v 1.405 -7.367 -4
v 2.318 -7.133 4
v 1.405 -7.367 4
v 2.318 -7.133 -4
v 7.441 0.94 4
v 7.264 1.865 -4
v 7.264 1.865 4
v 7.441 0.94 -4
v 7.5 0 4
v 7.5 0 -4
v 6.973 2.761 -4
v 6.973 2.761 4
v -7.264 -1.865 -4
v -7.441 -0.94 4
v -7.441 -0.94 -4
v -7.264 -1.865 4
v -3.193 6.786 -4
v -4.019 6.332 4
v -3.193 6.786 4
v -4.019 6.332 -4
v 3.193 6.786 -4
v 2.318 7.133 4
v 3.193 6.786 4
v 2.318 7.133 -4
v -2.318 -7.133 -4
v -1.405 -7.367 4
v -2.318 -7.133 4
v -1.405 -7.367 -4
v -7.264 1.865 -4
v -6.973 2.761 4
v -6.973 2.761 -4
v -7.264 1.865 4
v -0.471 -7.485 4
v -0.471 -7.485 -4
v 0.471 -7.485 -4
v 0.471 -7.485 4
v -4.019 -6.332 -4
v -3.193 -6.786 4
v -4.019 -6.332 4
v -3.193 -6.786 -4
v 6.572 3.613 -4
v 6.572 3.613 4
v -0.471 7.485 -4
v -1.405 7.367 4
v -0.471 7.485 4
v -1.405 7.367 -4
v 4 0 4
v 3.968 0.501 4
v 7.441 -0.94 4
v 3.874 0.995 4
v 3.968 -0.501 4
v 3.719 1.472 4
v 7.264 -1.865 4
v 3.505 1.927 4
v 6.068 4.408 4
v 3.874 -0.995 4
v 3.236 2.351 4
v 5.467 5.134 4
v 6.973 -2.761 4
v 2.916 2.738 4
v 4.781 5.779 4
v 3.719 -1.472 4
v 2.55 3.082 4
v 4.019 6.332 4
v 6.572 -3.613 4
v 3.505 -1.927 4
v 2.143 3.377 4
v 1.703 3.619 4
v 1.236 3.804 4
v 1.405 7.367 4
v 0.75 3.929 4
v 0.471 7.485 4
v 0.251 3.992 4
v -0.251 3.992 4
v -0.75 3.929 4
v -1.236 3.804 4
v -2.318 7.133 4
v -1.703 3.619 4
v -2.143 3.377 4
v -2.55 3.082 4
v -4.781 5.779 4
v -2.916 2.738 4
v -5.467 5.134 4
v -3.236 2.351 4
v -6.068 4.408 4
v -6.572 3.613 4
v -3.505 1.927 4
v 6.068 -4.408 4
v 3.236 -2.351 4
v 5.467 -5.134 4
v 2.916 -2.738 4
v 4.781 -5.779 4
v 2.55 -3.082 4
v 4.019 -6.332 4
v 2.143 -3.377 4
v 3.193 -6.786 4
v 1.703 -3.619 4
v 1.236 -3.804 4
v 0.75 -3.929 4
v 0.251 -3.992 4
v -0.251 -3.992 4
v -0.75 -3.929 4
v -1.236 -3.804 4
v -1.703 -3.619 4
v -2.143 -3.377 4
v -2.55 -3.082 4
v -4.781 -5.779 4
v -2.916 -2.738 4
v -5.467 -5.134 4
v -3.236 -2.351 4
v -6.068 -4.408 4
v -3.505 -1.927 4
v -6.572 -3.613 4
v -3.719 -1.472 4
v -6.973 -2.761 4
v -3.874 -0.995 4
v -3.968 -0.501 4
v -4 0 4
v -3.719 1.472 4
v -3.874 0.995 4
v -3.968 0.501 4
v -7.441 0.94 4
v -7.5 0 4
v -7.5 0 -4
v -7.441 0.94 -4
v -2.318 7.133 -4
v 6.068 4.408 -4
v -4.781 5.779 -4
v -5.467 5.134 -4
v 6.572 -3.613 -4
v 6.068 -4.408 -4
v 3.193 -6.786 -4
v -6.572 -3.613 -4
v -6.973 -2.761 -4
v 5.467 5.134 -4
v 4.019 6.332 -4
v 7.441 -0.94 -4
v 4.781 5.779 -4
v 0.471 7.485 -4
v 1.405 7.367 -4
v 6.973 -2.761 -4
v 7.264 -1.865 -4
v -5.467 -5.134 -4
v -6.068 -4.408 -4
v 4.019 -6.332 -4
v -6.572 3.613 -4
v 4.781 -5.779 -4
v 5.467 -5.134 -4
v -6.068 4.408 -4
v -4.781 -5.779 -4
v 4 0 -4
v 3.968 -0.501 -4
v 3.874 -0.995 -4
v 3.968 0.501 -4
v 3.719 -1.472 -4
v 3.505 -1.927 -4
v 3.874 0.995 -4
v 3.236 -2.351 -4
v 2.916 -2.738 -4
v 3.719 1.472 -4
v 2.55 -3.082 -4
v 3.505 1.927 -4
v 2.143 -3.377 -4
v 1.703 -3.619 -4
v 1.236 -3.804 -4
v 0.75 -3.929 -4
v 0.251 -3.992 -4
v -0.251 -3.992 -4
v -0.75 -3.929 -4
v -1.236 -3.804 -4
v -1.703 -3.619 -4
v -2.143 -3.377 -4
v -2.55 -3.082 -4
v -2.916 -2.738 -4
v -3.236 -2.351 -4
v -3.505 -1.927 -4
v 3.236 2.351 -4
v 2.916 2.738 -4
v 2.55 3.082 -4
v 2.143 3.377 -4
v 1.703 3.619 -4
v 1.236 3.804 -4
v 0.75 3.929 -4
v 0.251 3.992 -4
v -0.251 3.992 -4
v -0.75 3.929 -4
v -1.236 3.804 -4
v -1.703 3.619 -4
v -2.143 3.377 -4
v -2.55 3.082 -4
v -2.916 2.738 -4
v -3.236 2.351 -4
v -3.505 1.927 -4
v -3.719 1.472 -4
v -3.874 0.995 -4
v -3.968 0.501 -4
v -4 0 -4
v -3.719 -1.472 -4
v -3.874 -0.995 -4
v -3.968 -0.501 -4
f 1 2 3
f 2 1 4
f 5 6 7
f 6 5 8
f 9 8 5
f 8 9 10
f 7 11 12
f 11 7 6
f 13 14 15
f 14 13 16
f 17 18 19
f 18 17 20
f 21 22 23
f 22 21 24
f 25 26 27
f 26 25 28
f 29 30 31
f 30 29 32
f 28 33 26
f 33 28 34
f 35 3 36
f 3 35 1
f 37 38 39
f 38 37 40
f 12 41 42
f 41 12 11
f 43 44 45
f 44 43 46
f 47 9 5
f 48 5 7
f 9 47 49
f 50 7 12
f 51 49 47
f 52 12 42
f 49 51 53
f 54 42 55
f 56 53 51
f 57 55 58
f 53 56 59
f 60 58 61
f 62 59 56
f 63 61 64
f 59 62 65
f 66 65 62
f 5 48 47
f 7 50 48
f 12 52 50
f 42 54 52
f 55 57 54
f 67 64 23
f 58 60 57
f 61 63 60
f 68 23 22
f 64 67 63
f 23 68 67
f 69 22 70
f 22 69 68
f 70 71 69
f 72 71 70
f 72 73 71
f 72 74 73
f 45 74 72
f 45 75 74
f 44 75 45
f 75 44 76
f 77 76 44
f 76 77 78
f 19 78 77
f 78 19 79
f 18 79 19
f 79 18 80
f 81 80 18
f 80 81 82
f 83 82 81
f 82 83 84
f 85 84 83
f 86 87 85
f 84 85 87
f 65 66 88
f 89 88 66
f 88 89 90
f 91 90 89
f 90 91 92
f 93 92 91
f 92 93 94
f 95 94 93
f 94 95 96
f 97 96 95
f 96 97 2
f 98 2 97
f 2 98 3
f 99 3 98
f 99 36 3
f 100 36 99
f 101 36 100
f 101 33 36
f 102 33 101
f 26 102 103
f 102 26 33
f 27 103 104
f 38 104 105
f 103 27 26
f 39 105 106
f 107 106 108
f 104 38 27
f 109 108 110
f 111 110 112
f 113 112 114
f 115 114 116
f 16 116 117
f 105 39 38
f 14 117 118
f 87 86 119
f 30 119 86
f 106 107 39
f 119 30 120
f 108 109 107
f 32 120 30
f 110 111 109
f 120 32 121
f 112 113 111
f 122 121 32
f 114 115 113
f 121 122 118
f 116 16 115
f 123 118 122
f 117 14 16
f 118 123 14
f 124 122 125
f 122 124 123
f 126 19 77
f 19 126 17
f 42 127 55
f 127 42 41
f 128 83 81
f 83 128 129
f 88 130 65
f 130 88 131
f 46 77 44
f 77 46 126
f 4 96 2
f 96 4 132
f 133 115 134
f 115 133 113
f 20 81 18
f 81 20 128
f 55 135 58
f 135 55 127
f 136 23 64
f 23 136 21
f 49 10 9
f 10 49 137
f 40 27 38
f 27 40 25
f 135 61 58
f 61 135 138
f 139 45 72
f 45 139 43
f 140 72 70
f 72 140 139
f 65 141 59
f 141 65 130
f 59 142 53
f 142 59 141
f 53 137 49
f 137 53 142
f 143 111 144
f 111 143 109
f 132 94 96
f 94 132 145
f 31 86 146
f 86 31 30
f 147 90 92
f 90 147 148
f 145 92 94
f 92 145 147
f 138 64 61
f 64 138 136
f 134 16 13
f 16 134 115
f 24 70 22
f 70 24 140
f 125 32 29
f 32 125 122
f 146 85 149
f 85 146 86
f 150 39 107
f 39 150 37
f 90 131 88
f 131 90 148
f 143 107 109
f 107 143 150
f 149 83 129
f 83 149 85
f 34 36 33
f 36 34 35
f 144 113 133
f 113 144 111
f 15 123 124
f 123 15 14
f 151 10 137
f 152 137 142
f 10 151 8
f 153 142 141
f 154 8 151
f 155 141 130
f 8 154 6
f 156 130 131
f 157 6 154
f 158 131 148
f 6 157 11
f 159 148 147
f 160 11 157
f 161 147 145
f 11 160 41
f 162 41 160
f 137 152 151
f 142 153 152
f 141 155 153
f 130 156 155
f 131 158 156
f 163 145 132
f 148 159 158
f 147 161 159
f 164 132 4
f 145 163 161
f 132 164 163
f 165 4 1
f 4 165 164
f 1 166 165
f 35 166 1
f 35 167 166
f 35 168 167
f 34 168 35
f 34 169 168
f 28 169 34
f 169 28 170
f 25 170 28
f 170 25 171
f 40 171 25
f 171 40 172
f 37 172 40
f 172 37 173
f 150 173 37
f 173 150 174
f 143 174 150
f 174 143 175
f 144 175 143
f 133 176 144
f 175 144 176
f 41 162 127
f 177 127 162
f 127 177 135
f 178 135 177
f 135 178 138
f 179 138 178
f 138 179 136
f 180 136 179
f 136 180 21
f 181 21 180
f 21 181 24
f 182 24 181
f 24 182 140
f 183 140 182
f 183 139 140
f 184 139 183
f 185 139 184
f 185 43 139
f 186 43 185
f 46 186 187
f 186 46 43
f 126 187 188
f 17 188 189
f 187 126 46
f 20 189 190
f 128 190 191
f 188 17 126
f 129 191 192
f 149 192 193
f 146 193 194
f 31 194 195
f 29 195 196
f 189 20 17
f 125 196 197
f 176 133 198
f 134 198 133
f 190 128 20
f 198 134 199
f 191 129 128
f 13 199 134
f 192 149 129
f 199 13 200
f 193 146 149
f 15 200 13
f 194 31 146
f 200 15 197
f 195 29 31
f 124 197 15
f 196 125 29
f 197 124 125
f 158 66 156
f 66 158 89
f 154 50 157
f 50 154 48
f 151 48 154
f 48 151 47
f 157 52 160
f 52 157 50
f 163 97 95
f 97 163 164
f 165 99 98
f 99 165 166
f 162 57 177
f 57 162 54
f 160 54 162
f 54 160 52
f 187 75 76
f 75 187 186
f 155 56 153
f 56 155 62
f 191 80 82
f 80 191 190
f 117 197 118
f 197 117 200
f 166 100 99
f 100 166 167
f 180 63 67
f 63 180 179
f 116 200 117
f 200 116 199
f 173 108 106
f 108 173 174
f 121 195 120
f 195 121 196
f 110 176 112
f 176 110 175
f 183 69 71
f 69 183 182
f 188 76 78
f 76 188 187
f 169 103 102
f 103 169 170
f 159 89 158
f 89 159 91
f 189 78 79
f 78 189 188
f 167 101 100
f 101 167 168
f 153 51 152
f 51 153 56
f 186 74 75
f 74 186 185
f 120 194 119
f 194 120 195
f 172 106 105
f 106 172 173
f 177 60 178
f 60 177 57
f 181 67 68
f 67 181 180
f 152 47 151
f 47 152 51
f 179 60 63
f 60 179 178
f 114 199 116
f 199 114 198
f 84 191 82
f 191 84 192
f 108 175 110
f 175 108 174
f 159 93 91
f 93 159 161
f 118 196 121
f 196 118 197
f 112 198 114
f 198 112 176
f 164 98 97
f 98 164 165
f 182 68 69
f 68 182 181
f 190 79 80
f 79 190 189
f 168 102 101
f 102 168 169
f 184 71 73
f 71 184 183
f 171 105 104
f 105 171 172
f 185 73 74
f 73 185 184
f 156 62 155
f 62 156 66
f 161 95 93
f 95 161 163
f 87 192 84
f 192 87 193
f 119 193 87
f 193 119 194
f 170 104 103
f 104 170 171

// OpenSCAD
$fn = 50;


difference() {
	union() {
		translate(v = [0, 0, -4.0000000000]) {
			cylinder(h = 8, r = 7.5000000000);
		}
	}
	union() {
		translate(v = [0, 0, -100.0000000000]) {
			cylinder(h = 200, r = 4.0000000000);
		}
	}
}
